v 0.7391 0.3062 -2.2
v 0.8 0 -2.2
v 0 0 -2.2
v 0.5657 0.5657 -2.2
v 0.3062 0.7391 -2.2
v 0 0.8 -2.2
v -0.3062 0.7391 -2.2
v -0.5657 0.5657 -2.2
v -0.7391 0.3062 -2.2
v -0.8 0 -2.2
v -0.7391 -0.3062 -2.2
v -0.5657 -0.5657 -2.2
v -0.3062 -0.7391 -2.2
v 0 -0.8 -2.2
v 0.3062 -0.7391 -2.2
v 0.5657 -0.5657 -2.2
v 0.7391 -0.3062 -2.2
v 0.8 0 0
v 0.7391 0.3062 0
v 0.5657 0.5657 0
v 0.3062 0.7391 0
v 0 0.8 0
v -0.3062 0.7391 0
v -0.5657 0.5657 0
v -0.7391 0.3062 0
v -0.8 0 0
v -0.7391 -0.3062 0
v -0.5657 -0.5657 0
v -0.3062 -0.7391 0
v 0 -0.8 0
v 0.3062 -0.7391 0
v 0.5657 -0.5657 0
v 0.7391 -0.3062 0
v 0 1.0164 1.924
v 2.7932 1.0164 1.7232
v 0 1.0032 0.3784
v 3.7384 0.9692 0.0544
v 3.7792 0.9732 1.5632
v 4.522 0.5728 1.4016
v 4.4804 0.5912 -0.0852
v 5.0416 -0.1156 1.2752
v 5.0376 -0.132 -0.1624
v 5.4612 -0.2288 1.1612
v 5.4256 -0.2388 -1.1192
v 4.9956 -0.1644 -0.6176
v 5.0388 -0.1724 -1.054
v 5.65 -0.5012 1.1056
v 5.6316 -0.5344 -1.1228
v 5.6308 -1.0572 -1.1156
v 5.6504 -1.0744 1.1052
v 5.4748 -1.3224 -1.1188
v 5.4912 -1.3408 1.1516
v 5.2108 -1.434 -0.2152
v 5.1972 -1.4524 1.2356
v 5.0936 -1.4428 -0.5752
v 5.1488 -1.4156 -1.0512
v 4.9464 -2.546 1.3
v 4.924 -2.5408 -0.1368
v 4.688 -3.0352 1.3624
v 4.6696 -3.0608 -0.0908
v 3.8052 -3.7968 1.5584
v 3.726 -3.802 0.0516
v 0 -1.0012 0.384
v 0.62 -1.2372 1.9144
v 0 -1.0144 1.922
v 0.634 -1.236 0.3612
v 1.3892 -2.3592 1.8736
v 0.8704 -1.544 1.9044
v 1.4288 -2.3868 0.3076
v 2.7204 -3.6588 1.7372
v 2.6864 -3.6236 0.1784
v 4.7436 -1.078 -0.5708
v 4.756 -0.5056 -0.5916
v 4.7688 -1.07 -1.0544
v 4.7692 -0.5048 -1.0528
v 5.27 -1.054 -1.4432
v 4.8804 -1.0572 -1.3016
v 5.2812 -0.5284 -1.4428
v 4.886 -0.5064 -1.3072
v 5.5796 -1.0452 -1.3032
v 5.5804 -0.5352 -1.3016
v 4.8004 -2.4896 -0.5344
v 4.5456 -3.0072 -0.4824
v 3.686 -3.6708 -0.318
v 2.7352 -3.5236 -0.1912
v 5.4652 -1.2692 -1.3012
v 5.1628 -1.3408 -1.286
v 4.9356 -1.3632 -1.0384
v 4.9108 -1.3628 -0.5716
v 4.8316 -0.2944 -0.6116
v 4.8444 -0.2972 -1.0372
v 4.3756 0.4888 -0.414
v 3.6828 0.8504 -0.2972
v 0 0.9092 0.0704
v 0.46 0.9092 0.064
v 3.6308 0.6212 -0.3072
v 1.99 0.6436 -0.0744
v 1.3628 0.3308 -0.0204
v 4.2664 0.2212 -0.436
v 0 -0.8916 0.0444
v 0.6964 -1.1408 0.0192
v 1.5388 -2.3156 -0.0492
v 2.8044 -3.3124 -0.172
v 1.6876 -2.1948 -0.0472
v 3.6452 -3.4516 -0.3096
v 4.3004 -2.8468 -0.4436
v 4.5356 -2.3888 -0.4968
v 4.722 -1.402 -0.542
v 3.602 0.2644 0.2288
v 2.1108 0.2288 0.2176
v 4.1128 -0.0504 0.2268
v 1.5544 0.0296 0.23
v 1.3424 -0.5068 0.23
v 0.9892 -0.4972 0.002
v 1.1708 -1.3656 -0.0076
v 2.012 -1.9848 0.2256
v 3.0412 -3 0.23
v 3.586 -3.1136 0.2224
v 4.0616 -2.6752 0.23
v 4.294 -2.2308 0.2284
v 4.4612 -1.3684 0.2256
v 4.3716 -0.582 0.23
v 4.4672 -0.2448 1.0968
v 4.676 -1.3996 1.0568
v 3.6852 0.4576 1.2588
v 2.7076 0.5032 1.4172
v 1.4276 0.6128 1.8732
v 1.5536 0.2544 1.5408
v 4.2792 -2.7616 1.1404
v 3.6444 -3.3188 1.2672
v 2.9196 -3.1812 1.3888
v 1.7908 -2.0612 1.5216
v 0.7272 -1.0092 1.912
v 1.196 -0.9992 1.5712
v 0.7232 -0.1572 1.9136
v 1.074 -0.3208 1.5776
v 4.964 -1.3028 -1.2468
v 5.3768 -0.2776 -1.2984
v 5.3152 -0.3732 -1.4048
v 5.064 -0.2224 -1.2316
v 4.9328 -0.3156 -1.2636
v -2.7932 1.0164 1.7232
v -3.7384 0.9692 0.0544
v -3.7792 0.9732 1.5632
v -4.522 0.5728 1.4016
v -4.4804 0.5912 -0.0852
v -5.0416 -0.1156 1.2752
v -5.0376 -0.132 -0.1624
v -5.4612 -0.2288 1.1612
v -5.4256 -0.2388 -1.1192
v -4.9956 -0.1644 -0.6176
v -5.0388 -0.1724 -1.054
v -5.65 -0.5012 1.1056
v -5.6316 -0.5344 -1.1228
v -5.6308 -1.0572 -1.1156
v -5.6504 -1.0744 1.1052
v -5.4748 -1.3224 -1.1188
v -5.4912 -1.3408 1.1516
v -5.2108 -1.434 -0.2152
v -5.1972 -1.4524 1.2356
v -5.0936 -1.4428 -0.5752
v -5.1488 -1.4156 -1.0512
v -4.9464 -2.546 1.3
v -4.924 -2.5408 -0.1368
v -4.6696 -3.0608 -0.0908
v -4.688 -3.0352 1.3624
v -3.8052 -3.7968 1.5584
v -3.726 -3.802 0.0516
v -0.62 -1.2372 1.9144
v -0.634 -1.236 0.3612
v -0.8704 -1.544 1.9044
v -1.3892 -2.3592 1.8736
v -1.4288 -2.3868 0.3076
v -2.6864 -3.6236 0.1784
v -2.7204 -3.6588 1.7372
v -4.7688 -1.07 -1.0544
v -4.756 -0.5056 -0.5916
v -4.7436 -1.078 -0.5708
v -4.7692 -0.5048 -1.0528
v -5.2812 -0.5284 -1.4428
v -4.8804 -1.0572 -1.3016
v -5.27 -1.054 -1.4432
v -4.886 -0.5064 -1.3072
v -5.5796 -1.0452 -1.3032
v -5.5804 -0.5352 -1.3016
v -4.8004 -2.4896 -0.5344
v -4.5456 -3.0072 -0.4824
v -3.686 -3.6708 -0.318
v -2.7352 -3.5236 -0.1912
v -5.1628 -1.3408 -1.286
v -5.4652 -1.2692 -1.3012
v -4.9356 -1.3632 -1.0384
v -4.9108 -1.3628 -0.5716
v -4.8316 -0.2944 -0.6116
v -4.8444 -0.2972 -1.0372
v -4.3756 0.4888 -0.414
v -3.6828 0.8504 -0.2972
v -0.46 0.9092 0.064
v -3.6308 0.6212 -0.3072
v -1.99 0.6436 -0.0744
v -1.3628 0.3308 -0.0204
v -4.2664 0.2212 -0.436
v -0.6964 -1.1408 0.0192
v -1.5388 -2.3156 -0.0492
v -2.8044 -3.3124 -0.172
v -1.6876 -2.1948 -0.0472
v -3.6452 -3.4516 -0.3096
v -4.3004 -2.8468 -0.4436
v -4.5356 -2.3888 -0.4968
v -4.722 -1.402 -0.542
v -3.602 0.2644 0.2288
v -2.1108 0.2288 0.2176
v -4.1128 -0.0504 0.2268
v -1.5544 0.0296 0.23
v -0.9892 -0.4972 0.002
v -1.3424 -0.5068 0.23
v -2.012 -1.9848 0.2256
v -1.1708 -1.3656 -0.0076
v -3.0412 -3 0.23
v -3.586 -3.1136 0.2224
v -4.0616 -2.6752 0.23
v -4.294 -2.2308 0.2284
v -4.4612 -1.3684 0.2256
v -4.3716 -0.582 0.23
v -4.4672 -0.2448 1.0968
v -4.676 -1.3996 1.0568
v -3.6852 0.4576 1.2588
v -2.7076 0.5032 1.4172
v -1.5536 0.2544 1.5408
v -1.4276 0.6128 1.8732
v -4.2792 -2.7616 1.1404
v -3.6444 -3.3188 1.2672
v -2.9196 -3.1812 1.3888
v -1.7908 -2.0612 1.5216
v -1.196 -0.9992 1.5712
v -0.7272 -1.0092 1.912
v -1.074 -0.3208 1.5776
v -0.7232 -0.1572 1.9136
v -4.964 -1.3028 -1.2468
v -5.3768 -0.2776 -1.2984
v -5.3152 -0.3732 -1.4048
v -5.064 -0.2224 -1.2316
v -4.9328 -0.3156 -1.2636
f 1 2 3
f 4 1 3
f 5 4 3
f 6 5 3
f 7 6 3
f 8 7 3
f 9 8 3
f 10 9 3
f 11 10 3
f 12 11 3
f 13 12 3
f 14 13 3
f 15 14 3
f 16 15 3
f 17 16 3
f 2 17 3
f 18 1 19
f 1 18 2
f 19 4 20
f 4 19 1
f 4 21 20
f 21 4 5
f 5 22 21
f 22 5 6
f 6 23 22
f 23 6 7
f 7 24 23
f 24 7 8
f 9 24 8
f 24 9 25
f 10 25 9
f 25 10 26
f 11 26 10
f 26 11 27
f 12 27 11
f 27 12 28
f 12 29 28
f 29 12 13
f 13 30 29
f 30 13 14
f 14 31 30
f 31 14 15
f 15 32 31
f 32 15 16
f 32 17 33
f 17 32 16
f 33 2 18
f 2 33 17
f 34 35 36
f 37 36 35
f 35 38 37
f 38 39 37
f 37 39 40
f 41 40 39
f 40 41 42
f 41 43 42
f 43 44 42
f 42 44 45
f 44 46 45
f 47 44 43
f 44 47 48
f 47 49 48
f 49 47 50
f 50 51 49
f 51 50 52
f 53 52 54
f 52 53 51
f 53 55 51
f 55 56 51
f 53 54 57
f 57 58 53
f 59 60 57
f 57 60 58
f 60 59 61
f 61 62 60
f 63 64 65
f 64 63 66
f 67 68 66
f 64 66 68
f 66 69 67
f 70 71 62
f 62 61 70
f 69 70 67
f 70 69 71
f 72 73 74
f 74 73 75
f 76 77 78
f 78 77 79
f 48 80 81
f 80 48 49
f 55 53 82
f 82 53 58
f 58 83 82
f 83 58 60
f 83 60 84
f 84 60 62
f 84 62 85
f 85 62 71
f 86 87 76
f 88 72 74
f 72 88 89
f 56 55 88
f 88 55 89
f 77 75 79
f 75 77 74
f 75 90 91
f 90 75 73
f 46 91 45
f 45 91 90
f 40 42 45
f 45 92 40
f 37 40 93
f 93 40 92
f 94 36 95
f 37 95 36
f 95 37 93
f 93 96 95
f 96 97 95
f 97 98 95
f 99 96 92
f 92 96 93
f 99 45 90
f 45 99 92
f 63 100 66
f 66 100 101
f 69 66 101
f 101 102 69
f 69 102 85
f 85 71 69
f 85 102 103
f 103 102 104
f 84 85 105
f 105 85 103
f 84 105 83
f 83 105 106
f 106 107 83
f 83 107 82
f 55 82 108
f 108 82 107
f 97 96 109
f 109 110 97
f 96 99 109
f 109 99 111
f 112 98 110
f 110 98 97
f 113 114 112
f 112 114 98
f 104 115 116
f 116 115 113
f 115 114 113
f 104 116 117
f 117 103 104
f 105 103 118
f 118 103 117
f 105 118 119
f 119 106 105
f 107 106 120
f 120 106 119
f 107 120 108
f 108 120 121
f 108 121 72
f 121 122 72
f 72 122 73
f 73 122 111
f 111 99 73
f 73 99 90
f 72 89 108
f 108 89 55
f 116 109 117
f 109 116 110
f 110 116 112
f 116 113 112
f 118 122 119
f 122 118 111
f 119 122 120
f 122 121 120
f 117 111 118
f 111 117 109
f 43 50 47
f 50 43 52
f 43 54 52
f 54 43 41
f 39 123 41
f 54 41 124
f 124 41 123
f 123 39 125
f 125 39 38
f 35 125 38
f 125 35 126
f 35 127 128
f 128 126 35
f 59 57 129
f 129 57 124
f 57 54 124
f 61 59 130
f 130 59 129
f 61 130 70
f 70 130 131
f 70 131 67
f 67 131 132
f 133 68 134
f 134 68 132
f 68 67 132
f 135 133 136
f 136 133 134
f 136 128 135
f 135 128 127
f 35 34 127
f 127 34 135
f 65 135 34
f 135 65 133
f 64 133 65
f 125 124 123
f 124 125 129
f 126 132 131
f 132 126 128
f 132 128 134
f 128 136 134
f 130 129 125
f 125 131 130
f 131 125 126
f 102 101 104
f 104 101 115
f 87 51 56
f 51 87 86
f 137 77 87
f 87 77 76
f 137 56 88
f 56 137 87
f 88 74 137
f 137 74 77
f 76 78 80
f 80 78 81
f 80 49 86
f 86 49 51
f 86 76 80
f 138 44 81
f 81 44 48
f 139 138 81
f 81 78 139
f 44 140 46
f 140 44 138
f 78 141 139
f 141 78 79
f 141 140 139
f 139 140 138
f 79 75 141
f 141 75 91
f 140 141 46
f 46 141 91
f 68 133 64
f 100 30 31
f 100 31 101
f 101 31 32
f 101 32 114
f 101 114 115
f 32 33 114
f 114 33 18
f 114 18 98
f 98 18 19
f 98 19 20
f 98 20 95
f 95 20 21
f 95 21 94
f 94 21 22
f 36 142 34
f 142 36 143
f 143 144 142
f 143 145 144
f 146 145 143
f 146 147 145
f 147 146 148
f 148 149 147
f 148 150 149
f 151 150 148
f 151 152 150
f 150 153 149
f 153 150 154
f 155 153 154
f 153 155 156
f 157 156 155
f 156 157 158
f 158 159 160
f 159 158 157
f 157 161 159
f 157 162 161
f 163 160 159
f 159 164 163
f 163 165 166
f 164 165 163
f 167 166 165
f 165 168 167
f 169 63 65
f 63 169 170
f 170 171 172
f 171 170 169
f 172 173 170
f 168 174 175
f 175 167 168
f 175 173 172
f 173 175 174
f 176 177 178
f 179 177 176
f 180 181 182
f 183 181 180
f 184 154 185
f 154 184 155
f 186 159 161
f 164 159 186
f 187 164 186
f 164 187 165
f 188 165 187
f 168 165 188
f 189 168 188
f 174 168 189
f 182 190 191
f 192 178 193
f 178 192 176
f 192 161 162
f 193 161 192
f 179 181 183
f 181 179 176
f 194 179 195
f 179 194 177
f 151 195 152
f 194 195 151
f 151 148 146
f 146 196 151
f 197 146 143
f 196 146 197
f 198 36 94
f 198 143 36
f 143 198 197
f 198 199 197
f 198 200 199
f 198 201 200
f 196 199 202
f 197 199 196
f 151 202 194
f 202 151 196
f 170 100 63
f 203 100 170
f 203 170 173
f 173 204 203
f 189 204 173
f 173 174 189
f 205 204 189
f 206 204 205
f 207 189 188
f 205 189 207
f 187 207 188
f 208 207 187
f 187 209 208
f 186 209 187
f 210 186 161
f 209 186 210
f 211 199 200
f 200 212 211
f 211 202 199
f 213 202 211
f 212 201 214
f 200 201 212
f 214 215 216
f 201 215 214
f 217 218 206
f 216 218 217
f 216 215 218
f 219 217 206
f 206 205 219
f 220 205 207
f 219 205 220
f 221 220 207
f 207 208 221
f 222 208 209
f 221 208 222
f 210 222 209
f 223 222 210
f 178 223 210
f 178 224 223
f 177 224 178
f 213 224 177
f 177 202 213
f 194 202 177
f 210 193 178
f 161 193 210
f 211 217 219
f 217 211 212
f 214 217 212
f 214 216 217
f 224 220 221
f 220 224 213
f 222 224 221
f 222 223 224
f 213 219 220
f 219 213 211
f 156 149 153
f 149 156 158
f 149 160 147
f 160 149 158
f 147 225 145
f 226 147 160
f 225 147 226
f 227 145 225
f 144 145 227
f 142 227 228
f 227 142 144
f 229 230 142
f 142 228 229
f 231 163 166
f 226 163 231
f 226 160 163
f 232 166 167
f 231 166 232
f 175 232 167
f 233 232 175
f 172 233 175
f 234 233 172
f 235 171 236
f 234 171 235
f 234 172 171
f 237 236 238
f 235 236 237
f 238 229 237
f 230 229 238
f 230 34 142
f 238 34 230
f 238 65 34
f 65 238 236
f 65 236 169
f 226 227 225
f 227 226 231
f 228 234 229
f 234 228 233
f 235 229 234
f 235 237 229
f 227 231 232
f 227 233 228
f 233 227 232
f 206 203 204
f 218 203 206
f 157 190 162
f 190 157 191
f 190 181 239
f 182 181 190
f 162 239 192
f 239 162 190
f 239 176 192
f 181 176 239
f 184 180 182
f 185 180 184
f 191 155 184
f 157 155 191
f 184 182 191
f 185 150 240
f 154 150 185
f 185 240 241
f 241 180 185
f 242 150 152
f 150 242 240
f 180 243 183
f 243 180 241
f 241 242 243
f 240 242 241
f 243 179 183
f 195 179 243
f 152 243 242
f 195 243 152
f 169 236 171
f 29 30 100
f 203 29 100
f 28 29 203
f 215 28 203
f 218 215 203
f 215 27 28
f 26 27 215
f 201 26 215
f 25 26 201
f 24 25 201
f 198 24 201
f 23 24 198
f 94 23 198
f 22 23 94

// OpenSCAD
use <../lib.scad>
use <../p/4-4cylc.scad>
use <s/18854s01.scad>
function ldraw_lib__18854() = [
// 0 Figure Friends Sunglasses with Pin
// 0 Name: 18854.dat
// 0 Author: Philippe Hurbain [Philo]
// 0 !LDRAW_ORG Part UPDATE 2016-01
// 0 !LICENSE Licensed under CC BY 2.0 and CC BY 4.0 : see CAreadme.txt
// 
// 0 BFC CERTIFY CCW
  [0,"BFC","CERTIFY"],
  [0,"BFC","CCW"],
// 
// 0 !CATEGORY Figure Accessory
// 
// 0 !HISTORY 2016-03-18 {LEGO Digital Designer} Original part shape
// 0 !HISTORY 2016-10-05 [Philo] File preparation for LDraw Parts Tracker
// 0 !HISTORY 2016-12-31 [PTadmin] Official Update 2016-01
// 
// 
// 1 16 0 5.5 0 2 0 0 0 -5.5 0 0 0 2 4-4cylc.dat
  [1,16,0,5.5,0,2,0,0,0,-5.5,0,0,0,2, ldraw_lib__4_4cylc()],
// 1 16 0 0 0 1 0 0 0 1 0 0 0 1 s\18854s01.dat
  [1,16,0,0,0,1,0,0,0,1,0,0,0,1, ldraw_lib__s__18854s01()],
// 1 16 0 0 0 -1 0 0 0 1 0 0 0 1 s\18854s01.dat
  [1,16,0,0,0,-1,0,0,0,1,0,0,0,1, ldraw_lib__s__18854s01()],
// 5 24 0 -4.805 -2.536 0 -0.96 -2.503 1.55 -4.786 -3.093 -1.55 -4.786 -3.093
  [5,24,0,-4.805,-2.536,0,-0.96,-2.503,1.55,-4.786,-3.093,-1.55,-4.786,-3.093],
// 5 24 0 -0.176 2.273 0 -0.946 2.508 1.15 -0.16 2.273 -1.15 -0.16 2.273
  [5,24,0,-0.176,2.273,0,-0.946,2.508,1.15,-0.16,2.273,-1.15,-0.16,2.273],
// 5 24 0 -0.96 -2.503 0 -0.111 -2.229 1.585 -0.903 -3.09 -1.585 -0.903 -3.09
  [5,24,0,-0.96,-2.503,0,-0.111,-2.229,1.585,-0.903,-3.09,-1.585,-0.903,-3.09],
// 5 24 0 -4.81 2.541 0 -4.805 -2.536 1.808 -4.784 -0.393 -1.808 -4.784 -0.393
  [5,24,0,-4.81,2.541,0,-4.805,-2.536,1.808,-4.784,-0.393,-1.808,-4.784,-0.393],
// 5 24 0 -0.111 -2.229 0 0 -2 0.7654 0 -1.8478 -0.7654 0 -1.8478
  [5,24,0,-0.111,-2.229,0,0,-2,0.7654,0,-1.8478,-0.7654,0,-1.8478],
// 5 24 0 0 2 0 -0.176 2.273 0.7654 0 1.8478 -0.7654 0 1.8478
  [5,24,0,0,2,0,-0.176,2.273,0.7654,0,1.8478,-0.7654,0,1.8478],
];
module ldraw_lib__18854(step=0, col=false, unit=2/5, alt=false, line=0.2, solid=!$preview)
    makepoly(ldraw_lib__18854(), step=step, col=col, unit=unit, alt=alt, line=line, solid=solid);
ldraw_lib__18854(line=0.2);
